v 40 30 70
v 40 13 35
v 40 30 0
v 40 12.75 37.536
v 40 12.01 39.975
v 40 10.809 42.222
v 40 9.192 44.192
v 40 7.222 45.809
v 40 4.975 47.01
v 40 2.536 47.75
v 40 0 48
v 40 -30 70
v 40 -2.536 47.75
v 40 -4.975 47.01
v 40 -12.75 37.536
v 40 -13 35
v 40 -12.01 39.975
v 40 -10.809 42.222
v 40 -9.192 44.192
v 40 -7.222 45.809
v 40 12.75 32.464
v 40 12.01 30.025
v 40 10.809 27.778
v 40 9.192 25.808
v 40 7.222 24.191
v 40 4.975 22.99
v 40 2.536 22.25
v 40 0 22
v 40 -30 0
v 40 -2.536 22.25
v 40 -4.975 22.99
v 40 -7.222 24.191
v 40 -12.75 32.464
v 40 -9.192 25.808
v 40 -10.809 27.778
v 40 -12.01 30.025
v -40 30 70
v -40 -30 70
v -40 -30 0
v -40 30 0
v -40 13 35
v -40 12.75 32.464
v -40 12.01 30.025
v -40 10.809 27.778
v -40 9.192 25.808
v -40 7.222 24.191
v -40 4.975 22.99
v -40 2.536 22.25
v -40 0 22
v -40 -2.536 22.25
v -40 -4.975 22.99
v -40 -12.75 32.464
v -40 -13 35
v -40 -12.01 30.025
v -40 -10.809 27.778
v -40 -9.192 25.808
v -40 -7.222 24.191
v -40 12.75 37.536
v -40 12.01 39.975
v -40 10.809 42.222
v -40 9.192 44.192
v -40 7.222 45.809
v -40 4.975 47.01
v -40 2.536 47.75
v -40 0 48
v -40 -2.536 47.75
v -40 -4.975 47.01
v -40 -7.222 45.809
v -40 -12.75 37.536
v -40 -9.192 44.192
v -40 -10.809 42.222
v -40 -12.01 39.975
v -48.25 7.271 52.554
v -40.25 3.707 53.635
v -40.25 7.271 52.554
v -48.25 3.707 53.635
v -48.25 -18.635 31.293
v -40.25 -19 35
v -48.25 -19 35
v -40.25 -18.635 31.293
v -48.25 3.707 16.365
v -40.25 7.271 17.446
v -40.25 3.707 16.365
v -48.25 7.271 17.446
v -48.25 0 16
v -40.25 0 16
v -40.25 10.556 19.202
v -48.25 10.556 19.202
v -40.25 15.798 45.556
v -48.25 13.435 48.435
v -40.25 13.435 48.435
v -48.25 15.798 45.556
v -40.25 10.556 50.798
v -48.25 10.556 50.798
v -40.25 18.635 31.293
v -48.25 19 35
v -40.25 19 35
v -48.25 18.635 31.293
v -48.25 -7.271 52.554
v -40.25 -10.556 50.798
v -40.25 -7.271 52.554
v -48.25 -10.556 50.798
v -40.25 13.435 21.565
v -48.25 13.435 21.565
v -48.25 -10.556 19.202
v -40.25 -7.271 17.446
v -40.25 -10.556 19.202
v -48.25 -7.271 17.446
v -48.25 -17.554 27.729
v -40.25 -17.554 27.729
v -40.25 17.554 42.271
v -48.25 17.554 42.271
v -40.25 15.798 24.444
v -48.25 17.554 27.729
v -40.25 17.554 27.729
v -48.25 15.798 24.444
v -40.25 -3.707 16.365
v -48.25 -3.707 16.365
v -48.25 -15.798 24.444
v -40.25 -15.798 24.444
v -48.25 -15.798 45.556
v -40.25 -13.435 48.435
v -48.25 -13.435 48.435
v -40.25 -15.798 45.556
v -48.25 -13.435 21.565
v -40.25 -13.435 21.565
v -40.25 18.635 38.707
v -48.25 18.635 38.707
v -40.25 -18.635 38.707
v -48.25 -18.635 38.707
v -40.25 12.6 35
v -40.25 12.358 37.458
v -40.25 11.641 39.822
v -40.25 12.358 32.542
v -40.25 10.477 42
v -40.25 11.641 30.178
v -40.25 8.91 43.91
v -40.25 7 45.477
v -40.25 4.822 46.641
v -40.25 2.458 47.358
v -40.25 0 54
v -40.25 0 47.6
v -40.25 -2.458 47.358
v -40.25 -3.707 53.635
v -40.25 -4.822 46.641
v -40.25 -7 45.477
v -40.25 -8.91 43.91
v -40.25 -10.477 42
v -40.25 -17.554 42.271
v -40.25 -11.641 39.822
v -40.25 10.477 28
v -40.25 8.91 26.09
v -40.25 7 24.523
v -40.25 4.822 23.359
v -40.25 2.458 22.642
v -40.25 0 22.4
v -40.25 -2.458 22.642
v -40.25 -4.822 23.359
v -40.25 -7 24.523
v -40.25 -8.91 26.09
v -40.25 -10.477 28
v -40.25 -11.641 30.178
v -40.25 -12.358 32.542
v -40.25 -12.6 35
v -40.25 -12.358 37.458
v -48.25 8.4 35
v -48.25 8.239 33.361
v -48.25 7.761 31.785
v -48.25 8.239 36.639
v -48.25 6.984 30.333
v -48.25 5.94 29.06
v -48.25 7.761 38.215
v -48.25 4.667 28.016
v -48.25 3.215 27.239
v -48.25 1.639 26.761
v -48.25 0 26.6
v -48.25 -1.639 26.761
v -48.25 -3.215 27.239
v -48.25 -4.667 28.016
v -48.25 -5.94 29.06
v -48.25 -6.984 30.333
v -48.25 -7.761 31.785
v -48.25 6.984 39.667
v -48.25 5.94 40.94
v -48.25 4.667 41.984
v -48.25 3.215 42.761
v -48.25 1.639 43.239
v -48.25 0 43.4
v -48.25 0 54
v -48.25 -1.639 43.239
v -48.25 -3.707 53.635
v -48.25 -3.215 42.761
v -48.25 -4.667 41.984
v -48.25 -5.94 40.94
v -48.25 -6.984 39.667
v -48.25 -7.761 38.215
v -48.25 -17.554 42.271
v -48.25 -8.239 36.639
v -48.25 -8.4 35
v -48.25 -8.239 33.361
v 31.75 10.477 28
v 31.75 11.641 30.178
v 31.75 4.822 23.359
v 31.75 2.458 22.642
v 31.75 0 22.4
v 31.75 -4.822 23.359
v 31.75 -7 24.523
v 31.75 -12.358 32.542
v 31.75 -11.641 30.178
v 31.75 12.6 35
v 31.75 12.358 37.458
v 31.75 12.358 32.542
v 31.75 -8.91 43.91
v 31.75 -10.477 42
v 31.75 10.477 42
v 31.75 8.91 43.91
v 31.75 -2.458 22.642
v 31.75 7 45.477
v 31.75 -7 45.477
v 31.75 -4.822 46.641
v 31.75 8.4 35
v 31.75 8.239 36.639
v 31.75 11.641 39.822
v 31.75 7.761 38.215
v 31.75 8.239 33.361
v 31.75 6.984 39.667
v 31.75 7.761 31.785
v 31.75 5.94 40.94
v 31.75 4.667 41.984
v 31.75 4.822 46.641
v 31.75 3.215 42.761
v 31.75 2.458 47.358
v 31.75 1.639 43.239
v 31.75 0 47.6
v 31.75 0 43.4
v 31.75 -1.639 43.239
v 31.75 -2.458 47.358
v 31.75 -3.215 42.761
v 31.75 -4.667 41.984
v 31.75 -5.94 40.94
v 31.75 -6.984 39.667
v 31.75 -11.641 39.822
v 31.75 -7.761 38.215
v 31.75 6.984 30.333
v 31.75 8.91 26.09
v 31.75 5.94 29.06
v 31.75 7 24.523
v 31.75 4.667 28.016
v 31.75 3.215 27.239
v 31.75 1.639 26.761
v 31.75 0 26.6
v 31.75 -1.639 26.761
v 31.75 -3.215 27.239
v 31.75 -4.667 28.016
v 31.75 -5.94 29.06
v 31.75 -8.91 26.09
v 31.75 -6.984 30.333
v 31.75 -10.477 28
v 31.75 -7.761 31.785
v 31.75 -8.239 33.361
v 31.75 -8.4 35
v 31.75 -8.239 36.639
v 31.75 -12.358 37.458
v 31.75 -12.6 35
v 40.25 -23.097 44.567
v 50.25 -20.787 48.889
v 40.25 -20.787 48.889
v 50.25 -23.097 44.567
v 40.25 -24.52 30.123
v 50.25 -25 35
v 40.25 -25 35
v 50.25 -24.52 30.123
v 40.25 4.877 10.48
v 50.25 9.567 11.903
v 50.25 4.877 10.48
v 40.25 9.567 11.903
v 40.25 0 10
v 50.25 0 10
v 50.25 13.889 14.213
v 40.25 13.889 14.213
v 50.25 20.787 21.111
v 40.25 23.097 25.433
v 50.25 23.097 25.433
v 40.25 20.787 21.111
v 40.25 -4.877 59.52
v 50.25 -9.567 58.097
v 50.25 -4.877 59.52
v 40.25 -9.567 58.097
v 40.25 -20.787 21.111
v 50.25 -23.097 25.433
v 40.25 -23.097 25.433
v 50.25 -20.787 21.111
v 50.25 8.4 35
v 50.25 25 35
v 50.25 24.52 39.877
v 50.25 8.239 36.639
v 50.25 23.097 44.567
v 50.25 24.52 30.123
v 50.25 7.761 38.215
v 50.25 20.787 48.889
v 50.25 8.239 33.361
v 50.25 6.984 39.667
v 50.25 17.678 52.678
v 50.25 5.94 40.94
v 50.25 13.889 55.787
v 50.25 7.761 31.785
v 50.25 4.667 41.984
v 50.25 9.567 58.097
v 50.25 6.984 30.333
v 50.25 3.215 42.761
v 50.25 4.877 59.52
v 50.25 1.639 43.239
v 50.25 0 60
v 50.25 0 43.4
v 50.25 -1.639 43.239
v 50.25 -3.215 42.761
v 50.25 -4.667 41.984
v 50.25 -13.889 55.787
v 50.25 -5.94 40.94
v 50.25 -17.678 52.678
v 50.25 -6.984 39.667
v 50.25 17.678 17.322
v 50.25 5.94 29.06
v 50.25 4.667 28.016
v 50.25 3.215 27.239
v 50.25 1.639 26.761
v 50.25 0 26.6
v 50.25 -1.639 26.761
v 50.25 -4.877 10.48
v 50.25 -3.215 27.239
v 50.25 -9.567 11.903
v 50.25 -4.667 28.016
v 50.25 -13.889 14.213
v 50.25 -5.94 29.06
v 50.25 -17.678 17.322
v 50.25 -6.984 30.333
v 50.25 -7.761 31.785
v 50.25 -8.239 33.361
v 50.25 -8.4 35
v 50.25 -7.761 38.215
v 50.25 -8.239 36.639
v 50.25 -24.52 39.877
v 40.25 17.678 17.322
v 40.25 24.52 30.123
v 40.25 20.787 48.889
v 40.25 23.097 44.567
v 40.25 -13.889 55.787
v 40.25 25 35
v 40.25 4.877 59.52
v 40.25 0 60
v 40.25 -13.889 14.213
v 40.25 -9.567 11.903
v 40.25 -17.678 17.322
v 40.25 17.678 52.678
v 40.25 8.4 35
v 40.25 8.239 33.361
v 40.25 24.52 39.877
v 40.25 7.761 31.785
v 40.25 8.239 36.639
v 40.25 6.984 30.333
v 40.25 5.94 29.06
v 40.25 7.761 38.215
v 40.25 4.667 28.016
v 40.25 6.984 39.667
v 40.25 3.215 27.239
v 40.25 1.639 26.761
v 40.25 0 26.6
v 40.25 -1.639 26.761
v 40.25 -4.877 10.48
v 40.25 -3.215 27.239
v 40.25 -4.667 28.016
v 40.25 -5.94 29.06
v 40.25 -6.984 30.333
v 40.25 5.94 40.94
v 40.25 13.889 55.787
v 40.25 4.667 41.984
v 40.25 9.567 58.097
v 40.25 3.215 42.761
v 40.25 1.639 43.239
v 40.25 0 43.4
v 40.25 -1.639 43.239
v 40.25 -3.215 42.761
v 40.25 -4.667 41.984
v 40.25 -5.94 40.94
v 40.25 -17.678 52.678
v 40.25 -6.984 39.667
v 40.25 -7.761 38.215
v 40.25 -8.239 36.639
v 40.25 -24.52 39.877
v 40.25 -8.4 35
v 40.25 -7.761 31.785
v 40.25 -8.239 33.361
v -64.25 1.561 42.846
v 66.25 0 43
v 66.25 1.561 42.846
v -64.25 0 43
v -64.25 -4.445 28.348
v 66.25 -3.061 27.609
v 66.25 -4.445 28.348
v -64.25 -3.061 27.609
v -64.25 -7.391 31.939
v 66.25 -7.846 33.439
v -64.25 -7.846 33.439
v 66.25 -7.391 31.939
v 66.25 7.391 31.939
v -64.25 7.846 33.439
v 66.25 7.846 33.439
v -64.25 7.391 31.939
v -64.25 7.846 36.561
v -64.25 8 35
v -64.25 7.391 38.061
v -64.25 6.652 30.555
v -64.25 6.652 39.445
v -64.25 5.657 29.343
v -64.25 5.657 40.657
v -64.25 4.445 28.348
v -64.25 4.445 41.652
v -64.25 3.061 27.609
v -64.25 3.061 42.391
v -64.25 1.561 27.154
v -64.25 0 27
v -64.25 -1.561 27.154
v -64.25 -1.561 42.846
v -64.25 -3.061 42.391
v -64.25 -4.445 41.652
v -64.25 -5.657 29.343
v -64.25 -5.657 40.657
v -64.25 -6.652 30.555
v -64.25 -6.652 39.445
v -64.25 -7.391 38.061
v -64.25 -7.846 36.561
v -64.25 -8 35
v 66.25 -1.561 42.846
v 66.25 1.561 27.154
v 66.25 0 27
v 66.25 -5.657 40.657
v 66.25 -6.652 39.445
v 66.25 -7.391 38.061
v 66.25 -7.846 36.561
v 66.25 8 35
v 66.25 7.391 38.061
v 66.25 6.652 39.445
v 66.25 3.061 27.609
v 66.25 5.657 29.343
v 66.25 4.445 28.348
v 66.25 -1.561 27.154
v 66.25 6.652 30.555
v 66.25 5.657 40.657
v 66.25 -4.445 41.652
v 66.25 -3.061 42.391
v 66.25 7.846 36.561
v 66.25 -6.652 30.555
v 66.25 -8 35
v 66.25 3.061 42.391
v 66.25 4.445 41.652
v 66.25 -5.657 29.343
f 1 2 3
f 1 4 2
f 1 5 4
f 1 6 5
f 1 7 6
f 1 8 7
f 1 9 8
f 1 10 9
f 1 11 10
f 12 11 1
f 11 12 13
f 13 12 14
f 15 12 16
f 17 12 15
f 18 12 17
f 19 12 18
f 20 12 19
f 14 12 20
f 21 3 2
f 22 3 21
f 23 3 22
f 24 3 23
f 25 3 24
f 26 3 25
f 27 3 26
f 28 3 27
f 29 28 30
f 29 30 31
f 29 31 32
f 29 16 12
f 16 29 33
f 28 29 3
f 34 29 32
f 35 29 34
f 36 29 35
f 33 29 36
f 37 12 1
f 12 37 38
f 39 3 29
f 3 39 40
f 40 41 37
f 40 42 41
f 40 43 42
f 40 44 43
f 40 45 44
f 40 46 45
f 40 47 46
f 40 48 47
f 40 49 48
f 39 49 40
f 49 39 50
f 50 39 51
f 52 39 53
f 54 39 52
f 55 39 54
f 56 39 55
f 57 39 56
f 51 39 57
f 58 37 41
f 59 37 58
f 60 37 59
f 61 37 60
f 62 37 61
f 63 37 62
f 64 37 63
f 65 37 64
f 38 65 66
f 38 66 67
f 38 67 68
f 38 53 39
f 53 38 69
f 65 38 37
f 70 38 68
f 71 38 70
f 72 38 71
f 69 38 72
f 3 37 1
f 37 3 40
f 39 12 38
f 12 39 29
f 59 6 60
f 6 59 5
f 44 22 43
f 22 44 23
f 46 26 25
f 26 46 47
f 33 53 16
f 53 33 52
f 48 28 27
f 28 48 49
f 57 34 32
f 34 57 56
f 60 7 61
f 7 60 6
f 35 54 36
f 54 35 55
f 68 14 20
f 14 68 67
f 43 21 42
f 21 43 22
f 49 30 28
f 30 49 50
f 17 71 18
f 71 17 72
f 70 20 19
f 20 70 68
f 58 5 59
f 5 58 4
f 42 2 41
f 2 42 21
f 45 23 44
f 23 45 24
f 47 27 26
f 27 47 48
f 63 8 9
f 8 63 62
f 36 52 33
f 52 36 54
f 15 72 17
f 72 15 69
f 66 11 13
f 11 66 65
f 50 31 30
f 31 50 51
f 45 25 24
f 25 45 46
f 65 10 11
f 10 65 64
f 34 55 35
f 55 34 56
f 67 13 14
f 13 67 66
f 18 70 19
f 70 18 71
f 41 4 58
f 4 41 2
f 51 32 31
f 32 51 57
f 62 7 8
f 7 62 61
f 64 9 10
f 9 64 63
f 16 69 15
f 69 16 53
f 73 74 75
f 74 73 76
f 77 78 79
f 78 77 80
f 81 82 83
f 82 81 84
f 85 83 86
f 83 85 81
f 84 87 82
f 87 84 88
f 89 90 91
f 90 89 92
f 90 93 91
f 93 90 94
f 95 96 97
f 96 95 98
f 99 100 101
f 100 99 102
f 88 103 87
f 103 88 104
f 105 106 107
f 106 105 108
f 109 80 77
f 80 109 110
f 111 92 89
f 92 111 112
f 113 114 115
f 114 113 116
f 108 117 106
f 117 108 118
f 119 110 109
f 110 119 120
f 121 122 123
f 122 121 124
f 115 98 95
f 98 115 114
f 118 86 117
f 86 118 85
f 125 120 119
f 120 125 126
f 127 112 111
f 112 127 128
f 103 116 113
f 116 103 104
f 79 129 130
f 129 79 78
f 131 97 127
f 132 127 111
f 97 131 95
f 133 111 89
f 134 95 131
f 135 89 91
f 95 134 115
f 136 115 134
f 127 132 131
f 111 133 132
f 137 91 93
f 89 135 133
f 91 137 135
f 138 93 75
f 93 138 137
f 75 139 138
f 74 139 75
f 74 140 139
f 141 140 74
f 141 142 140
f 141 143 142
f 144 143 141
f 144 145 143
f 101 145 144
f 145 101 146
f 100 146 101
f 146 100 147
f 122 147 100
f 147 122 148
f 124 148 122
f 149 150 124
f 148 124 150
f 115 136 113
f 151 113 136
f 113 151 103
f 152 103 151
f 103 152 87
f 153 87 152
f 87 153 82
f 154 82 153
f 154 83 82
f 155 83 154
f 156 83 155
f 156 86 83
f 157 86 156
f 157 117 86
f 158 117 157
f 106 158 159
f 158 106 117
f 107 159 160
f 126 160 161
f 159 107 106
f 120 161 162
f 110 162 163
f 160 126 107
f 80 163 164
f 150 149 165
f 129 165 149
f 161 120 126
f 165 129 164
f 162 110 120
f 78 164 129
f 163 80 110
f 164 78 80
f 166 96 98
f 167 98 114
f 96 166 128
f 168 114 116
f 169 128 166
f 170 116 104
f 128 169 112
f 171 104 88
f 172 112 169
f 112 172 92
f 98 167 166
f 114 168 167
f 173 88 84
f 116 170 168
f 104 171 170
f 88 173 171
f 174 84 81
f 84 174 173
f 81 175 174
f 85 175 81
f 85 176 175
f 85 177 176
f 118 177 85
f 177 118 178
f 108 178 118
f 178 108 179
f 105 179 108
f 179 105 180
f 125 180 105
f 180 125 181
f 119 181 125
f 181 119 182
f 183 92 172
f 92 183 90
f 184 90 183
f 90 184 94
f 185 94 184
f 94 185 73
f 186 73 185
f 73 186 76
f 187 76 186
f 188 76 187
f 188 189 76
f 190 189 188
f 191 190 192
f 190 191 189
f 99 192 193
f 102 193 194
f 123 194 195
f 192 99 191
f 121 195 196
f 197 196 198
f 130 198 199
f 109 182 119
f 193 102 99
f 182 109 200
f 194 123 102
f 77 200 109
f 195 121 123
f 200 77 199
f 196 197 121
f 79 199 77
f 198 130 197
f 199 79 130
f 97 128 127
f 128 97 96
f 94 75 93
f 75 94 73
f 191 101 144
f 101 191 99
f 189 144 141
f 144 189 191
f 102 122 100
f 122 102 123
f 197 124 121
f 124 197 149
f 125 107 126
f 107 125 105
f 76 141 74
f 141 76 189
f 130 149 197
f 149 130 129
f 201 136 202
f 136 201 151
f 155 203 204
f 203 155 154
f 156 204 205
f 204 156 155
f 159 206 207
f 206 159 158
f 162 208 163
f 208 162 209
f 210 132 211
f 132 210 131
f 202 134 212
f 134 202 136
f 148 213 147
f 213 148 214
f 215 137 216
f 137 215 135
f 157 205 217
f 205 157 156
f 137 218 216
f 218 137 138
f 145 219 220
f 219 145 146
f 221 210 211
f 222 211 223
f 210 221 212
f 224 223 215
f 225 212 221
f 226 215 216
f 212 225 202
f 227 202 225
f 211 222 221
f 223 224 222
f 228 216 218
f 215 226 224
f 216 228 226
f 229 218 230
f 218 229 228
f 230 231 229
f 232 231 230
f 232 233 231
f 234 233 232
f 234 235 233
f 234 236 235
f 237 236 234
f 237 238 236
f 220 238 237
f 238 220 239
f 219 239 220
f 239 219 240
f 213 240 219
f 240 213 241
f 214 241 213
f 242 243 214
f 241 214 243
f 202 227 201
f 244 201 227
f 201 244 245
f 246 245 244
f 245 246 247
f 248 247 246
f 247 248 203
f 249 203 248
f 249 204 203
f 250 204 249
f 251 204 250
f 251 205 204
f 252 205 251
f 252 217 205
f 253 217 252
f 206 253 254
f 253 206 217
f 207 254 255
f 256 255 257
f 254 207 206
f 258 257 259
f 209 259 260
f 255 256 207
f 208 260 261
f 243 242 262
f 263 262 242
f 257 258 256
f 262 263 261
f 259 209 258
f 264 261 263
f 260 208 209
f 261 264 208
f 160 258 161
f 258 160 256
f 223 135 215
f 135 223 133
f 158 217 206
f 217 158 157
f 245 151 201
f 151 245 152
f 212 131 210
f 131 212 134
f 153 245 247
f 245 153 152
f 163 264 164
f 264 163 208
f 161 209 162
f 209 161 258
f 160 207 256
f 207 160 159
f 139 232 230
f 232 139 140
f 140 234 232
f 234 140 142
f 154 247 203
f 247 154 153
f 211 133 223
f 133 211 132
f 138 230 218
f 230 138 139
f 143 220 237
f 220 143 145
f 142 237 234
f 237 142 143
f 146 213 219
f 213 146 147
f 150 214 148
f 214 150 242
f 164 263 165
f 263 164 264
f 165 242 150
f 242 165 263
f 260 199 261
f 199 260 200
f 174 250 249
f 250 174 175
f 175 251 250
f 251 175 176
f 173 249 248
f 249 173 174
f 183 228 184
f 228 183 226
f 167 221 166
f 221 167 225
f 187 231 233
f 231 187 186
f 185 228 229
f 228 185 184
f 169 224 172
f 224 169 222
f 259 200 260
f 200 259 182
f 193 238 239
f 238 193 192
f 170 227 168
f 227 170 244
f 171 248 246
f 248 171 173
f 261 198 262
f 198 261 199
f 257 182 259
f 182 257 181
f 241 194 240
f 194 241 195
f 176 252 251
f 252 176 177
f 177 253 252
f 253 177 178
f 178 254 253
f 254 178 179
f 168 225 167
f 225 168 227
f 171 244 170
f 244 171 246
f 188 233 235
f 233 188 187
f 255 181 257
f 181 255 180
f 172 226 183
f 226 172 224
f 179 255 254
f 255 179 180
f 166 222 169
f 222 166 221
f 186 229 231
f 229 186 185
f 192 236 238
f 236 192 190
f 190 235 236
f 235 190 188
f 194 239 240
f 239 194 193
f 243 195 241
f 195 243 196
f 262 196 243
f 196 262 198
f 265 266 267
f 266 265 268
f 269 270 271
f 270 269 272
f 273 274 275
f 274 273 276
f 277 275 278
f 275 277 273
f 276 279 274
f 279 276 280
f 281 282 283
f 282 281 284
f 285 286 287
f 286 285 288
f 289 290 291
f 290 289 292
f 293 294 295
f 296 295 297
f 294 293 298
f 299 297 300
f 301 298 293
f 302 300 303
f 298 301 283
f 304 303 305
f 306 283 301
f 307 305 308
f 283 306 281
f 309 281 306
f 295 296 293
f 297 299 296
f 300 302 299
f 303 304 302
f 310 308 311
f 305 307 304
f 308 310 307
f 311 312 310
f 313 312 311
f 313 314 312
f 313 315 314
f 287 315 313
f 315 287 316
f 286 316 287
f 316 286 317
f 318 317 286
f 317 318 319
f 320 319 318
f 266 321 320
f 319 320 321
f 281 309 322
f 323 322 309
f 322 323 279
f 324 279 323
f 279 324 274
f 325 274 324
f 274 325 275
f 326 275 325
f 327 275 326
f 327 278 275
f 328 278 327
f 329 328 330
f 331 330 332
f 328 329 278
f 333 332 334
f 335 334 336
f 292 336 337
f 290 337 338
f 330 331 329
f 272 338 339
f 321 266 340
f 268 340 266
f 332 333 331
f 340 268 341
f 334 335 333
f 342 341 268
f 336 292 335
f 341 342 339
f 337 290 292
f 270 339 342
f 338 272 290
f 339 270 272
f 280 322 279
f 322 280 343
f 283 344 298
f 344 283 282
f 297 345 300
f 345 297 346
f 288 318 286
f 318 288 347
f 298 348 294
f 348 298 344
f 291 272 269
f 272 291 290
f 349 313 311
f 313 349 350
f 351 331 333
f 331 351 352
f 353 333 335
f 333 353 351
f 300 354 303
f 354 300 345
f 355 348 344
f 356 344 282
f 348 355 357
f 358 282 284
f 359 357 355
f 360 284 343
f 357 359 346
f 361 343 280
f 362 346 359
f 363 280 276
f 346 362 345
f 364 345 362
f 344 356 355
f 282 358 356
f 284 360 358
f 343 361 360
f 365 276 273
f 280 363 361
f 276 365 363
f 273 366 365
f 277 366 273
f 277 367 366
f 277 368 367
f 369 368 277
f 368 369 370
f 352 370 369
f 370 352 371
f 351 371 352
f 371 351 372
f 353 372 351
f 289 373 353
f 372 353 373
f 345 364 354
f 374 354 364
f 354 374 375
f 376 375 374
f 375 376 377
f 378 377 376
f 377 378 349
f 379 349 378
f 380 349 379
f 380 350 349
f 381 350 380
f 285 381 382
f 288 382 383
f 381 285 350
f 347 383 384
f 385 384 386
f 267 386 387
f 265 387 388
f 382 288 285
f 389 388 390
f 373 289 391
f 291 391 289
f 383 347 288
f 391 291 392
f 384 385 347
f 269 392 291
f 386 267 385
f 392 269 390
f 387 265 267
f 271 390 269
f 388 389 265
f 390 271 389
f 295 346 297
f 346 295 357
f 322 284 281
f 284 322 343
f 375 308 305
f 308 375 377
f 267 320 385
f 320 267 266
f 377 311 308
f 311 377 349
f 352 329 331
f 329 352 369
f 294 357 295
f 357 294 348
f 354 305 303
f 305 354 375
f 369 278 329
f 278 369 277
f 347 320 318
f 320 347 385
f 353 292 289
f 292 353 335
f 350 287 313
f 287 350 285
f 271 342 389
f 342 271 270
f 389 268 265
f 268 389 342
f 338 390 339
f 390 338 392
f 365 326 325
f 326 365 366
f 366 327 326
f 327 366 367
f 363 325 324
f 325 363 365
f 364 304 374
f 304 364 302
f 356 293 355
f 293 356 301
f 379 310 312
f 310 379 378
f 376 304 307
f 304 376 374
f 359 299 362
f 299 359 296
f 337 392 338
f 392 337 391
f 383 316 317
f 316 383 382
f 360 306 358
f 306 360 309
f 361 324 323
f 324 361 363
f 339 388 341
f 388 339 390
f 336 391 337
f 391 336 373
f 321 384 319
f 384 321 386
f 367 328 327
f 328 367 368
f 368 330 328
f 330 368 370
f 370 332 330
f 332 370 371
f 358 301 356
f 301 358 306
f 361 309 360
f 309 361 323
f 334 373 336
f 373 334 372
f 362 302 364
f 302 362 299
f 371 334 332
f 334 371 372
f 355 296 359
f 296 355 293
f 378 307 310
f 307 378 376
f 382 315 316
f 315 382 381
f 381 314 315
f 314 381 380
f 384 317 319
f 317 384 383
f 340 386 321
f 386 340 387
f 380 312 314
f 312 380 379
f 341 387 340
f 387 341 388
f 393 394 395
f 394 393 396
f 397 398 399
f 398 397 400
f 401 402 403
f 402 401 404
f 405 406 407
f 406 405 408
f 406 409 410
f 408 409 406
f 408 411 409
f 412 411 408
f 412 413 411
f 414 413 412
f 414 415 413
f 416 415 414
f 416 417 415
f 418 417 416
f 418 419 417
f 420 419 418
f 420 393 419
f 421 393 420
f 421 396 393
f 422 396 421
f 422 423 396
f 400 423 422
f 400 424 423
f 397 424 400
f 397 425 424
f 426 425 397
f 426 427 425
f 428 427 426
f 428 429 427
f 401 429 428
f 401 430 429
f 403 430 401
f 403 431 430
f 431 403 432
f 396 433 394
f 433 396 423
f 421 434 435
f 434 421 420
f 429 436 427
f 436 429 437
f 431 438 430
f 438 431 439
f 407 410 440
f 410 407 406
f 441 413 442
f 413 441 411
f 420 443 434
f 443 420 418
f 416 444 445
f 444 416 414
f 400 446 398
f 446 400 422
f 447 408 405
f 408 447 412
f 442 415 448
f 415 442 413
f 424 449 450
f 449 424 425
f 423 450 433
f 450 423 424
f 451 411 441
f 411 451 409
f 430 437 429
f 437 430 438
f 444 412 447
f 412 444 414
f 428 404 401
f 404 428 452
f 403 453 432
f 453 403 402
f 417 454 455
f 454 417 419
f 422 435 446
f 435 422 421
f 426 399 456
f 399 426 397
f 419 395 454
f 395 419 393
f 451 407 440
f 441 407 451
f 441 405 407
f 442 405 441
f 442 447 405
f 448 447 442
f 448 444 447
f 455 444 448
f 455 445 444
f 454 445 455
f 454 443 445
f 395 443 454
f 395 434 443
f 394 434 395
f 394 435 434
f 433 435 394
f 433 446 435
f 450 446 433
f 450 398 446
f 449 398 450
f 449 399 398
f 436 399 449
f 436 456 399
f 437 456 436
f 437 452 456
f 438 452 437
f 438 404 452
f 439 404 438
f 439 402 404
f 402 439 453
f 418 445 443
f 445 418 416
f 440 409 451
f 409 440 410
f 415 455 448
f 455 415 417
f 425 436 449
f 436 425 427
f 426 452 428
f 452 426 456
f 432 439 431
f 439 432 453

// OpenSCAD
$fn = 32;

// ------------------------------------------------------------------------
// Bushed housing: 80 x 60 x 70 mm housing, bushing d25.2
// Every part is its own module, assembly() places them once.
// ------------------------------------------------------------------------

// --- part 1 ---
module housing() {
  difference() {
    translate([-40, -30, 0]) cube([80, 60, 70]);
    translate([0, 0, 35]) rotate([0, 90, 0]) cylinder(h = 82, d = 26, center = true);
  }
}

// --- part 2 ---
module bushing() {
  difference() {
    union() {
      cylinder(h = 8, d = 38);
      translate([0, 0, 8]) cylinder(h = 72, d = 25.2);
    }
    translate([0, 0, -1]) cylinder(h = 82, d = 16.8);
  }
}

// --- part 3 ---
module shaft() {
  translate([0, 0, -65.25]) cylinder(h = 130.5, d = 16);
}

// --- part 4 ---
module cover() {
  difference() {
    cylinder(h = 10, d = 50);
    translate([0, 0, -1]) cylinder(h = 12, d = 16.8);
  }
}

// --- assembly ---
module assembly() {
  translate([0, 0, 0]) rotate([0, 0, 0]) housing();
  translate([-48.25, 0, 35]) rotate([0, 90, 0]) bushing();
  translate([1, 0, 35]) rotate([0, 90, 0]) shaft();
  translate([40.25, 0, 35]) rotate([0, 90, 0]) cover();
}

assembly();
